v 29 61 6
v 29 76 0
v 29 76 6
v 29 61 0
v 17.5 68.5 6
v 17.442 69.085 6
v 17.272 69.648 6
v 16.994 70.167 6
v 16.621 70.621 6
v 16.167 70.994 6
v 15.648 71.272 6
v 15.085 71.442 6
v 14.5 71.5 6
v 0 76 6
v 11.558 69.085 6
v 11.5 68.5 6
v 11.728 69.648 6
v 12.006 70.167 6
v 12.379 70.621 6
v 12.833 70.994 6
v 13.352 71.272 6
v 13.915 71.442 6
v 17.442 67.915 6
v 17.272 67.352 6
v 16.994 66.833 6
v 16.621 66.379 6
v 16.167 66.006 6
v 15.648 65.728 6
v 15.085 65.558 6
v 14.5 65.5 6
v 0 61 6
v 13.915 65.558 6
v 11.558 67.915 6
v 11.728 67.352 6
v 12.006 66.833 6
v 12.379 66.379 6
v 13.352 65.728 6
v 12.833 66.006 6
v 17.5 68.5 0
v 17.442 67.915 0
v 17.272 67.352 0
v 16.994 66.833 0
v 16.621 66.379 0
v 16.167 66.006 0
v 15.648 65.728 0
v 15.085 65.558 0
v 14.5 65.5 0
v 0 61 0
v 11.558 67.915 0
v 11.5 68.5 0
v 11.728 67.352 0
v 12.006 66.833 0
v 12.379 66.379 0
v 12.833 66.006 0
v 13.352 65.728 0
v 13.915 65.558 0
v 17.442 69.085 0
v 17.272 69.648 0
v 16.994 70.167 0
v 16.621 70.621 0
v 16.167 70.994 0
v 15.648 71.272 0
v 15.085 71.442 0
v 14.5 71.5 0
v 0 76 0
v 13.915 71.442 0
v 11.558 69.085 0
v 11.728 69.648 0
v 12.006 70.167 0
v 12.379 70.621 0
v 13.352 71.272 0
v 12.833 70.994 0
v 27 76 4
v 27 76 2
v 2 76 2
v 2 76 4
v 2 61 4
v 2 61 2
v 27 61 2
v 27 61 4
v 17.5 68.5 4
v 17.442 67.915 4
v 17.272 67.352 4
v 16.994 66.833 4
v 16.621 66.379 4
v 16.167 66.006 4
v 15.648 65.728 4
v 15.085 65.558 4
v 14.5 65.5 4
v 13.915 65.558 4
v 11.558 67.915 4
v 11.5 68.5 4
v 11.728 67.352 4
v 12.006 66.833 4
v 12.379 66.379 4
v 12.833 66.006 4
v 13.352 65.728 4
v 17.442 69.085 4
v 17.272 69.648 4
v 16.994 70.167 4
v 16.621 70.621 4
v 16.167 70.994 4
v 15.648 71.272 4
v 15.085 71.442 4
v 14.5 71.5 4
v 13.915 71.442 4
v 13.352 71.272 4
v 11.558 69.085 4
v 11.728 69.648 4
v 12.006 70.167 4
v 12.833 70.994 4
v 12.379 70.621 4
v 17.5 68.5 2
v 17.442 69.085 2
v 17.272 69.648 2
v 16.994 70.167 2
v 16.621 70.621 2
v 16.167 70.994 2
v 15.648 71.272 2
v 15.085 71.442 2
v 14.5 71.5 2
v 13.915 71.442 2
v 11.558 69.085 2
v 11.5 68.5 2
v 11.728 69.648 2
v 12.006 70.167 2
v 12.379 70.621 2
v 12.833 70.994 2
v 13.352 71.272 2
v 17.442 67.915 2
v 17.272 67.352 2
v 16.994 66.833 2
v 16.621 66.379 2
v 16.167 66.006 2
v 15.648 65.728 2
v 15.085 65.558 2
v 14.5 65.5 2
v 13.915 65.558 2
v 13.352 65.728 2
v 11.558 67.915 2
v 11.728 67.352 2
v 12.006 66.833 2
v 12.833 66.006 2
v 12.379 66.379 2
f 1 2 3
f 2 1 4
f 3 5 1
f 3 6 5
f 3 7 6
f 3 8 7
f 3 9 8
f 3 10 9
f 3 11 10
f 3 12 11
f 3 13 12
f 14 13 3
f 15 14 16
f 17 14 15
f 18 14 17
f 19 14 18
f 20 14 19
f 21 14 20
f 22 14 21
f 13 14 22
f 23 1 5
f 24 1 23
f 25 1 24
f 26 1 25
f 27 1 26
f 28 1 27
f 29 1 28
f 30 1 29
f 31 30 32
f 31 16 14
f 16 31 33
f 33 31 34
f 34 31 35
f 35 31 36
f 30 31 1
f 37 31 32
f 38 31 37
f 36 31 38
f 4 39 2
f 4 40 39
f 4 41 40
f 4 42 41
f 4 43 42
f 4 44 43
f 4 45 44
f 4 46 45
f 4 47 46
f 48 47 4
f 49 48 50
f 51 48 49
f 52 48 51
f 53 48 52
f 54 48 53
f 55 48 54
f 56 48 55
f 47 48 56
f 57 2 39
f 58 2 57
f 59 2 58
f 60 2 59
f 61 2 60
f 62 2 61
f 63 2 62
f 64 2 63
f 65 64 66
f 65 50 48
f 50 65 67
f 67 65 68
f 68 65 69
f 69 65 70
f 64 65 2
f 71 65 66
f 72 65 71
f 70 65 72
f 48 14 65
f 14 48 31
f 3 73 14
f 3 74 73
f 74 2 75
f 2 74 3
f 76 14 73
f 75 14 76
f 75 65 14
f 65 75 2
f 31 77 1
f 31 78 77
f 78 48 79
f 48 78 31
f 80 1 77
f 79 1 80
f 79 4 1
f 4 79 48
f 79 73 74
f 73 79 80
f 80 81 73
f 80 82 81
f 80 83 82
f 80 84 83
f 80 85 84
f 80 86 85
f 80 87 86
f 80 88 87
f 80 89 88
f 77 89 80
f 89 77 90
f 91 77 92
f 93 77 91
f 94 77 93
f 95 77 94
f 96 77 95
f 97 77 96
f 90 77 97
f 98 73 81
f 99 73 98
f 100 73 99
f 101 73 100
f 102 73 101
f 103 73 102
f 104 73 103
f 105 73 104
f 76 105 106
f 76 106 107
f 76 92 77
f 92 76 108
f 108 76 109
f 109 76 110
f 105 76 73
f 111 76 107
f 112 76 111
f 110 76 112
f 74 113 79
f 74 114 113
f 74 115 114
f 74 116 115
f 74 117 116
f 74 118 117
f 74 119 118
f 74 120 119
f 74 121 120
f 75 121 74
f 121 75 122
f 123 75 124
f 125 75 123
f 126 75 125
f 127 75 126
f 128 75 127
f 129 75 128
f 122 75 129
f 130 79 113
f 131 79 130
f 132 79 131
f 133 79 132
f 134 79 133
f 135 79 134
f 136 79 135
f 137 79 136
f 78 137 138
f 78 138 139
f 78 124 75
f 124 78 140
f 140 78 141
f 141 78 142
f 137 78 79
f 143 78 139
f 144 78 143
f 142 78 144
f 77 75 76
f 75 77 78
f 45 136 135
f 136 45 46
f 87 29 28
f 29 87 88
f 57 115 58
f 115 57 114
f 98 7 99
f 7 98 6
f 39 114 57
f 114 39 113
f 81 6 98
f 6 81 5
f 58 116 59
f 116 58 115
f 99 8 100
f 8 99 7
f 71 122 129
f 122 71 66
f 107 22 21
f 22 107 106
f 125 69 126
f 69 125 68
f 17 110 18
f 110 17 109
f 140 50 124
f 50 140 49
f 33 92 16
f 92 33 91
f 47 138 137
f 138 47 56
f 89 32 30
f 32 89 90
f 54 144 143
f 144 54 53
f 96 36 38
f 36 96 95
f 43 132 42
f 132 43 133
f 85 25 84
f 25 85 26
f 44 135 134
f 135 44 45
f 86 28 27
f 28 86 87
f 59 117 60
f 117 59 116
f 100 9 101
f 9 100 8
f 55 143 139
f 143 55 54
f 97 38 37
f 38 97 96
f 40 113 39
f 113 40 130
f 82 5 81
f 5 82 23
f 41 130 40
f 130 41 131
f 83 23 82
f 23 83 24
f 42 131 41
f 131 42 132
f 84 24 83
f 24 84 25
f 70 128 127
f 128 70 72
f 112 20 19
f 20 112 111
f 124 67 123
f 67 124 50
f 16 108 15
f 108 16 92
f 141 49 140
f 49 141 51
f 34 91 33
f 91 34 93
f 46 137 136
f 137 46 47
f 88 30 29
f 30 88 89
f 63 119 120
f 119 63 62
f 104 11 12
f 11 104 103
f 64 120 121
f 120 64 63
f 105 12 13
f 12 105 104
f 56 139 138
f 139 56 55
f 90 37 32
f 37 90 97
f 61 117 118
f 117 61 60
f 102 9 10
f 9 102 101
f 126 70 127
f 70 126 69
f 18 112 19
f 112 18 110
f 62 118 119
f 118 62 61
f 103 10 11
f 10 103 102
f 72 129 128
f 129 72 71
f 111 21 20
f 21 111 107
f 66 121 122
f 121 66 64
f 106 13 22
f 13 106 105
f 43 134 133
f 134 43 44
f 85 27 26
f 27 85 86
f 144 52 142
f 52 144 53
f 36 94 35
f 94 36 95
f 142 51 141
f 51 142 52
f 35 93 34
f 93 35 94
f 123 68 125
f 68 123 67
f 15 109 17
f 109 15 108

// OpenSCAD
$fn=32;

strapW=25;
strapT=2;

clipW=15;
clipT=2;

clipL=strapW+clipT*2;
clipH=strapT+clipT*2;

medalStrapClip();

module medalStrapClip() {
  color("silver") {
    translate([0,61,0]) difference() {
      cube([clipL,clipW,clipH]);
      translate([0,-1,0]) strap();
      translate([clipL/2,clipW/2,-1]) cylinder(r=3,h=100, $fn=32);
    }
  }
}


module strap() {
  color("#502D16") translate([clipT,0,clipT]) cube([strapW,150,strapT]);
}
